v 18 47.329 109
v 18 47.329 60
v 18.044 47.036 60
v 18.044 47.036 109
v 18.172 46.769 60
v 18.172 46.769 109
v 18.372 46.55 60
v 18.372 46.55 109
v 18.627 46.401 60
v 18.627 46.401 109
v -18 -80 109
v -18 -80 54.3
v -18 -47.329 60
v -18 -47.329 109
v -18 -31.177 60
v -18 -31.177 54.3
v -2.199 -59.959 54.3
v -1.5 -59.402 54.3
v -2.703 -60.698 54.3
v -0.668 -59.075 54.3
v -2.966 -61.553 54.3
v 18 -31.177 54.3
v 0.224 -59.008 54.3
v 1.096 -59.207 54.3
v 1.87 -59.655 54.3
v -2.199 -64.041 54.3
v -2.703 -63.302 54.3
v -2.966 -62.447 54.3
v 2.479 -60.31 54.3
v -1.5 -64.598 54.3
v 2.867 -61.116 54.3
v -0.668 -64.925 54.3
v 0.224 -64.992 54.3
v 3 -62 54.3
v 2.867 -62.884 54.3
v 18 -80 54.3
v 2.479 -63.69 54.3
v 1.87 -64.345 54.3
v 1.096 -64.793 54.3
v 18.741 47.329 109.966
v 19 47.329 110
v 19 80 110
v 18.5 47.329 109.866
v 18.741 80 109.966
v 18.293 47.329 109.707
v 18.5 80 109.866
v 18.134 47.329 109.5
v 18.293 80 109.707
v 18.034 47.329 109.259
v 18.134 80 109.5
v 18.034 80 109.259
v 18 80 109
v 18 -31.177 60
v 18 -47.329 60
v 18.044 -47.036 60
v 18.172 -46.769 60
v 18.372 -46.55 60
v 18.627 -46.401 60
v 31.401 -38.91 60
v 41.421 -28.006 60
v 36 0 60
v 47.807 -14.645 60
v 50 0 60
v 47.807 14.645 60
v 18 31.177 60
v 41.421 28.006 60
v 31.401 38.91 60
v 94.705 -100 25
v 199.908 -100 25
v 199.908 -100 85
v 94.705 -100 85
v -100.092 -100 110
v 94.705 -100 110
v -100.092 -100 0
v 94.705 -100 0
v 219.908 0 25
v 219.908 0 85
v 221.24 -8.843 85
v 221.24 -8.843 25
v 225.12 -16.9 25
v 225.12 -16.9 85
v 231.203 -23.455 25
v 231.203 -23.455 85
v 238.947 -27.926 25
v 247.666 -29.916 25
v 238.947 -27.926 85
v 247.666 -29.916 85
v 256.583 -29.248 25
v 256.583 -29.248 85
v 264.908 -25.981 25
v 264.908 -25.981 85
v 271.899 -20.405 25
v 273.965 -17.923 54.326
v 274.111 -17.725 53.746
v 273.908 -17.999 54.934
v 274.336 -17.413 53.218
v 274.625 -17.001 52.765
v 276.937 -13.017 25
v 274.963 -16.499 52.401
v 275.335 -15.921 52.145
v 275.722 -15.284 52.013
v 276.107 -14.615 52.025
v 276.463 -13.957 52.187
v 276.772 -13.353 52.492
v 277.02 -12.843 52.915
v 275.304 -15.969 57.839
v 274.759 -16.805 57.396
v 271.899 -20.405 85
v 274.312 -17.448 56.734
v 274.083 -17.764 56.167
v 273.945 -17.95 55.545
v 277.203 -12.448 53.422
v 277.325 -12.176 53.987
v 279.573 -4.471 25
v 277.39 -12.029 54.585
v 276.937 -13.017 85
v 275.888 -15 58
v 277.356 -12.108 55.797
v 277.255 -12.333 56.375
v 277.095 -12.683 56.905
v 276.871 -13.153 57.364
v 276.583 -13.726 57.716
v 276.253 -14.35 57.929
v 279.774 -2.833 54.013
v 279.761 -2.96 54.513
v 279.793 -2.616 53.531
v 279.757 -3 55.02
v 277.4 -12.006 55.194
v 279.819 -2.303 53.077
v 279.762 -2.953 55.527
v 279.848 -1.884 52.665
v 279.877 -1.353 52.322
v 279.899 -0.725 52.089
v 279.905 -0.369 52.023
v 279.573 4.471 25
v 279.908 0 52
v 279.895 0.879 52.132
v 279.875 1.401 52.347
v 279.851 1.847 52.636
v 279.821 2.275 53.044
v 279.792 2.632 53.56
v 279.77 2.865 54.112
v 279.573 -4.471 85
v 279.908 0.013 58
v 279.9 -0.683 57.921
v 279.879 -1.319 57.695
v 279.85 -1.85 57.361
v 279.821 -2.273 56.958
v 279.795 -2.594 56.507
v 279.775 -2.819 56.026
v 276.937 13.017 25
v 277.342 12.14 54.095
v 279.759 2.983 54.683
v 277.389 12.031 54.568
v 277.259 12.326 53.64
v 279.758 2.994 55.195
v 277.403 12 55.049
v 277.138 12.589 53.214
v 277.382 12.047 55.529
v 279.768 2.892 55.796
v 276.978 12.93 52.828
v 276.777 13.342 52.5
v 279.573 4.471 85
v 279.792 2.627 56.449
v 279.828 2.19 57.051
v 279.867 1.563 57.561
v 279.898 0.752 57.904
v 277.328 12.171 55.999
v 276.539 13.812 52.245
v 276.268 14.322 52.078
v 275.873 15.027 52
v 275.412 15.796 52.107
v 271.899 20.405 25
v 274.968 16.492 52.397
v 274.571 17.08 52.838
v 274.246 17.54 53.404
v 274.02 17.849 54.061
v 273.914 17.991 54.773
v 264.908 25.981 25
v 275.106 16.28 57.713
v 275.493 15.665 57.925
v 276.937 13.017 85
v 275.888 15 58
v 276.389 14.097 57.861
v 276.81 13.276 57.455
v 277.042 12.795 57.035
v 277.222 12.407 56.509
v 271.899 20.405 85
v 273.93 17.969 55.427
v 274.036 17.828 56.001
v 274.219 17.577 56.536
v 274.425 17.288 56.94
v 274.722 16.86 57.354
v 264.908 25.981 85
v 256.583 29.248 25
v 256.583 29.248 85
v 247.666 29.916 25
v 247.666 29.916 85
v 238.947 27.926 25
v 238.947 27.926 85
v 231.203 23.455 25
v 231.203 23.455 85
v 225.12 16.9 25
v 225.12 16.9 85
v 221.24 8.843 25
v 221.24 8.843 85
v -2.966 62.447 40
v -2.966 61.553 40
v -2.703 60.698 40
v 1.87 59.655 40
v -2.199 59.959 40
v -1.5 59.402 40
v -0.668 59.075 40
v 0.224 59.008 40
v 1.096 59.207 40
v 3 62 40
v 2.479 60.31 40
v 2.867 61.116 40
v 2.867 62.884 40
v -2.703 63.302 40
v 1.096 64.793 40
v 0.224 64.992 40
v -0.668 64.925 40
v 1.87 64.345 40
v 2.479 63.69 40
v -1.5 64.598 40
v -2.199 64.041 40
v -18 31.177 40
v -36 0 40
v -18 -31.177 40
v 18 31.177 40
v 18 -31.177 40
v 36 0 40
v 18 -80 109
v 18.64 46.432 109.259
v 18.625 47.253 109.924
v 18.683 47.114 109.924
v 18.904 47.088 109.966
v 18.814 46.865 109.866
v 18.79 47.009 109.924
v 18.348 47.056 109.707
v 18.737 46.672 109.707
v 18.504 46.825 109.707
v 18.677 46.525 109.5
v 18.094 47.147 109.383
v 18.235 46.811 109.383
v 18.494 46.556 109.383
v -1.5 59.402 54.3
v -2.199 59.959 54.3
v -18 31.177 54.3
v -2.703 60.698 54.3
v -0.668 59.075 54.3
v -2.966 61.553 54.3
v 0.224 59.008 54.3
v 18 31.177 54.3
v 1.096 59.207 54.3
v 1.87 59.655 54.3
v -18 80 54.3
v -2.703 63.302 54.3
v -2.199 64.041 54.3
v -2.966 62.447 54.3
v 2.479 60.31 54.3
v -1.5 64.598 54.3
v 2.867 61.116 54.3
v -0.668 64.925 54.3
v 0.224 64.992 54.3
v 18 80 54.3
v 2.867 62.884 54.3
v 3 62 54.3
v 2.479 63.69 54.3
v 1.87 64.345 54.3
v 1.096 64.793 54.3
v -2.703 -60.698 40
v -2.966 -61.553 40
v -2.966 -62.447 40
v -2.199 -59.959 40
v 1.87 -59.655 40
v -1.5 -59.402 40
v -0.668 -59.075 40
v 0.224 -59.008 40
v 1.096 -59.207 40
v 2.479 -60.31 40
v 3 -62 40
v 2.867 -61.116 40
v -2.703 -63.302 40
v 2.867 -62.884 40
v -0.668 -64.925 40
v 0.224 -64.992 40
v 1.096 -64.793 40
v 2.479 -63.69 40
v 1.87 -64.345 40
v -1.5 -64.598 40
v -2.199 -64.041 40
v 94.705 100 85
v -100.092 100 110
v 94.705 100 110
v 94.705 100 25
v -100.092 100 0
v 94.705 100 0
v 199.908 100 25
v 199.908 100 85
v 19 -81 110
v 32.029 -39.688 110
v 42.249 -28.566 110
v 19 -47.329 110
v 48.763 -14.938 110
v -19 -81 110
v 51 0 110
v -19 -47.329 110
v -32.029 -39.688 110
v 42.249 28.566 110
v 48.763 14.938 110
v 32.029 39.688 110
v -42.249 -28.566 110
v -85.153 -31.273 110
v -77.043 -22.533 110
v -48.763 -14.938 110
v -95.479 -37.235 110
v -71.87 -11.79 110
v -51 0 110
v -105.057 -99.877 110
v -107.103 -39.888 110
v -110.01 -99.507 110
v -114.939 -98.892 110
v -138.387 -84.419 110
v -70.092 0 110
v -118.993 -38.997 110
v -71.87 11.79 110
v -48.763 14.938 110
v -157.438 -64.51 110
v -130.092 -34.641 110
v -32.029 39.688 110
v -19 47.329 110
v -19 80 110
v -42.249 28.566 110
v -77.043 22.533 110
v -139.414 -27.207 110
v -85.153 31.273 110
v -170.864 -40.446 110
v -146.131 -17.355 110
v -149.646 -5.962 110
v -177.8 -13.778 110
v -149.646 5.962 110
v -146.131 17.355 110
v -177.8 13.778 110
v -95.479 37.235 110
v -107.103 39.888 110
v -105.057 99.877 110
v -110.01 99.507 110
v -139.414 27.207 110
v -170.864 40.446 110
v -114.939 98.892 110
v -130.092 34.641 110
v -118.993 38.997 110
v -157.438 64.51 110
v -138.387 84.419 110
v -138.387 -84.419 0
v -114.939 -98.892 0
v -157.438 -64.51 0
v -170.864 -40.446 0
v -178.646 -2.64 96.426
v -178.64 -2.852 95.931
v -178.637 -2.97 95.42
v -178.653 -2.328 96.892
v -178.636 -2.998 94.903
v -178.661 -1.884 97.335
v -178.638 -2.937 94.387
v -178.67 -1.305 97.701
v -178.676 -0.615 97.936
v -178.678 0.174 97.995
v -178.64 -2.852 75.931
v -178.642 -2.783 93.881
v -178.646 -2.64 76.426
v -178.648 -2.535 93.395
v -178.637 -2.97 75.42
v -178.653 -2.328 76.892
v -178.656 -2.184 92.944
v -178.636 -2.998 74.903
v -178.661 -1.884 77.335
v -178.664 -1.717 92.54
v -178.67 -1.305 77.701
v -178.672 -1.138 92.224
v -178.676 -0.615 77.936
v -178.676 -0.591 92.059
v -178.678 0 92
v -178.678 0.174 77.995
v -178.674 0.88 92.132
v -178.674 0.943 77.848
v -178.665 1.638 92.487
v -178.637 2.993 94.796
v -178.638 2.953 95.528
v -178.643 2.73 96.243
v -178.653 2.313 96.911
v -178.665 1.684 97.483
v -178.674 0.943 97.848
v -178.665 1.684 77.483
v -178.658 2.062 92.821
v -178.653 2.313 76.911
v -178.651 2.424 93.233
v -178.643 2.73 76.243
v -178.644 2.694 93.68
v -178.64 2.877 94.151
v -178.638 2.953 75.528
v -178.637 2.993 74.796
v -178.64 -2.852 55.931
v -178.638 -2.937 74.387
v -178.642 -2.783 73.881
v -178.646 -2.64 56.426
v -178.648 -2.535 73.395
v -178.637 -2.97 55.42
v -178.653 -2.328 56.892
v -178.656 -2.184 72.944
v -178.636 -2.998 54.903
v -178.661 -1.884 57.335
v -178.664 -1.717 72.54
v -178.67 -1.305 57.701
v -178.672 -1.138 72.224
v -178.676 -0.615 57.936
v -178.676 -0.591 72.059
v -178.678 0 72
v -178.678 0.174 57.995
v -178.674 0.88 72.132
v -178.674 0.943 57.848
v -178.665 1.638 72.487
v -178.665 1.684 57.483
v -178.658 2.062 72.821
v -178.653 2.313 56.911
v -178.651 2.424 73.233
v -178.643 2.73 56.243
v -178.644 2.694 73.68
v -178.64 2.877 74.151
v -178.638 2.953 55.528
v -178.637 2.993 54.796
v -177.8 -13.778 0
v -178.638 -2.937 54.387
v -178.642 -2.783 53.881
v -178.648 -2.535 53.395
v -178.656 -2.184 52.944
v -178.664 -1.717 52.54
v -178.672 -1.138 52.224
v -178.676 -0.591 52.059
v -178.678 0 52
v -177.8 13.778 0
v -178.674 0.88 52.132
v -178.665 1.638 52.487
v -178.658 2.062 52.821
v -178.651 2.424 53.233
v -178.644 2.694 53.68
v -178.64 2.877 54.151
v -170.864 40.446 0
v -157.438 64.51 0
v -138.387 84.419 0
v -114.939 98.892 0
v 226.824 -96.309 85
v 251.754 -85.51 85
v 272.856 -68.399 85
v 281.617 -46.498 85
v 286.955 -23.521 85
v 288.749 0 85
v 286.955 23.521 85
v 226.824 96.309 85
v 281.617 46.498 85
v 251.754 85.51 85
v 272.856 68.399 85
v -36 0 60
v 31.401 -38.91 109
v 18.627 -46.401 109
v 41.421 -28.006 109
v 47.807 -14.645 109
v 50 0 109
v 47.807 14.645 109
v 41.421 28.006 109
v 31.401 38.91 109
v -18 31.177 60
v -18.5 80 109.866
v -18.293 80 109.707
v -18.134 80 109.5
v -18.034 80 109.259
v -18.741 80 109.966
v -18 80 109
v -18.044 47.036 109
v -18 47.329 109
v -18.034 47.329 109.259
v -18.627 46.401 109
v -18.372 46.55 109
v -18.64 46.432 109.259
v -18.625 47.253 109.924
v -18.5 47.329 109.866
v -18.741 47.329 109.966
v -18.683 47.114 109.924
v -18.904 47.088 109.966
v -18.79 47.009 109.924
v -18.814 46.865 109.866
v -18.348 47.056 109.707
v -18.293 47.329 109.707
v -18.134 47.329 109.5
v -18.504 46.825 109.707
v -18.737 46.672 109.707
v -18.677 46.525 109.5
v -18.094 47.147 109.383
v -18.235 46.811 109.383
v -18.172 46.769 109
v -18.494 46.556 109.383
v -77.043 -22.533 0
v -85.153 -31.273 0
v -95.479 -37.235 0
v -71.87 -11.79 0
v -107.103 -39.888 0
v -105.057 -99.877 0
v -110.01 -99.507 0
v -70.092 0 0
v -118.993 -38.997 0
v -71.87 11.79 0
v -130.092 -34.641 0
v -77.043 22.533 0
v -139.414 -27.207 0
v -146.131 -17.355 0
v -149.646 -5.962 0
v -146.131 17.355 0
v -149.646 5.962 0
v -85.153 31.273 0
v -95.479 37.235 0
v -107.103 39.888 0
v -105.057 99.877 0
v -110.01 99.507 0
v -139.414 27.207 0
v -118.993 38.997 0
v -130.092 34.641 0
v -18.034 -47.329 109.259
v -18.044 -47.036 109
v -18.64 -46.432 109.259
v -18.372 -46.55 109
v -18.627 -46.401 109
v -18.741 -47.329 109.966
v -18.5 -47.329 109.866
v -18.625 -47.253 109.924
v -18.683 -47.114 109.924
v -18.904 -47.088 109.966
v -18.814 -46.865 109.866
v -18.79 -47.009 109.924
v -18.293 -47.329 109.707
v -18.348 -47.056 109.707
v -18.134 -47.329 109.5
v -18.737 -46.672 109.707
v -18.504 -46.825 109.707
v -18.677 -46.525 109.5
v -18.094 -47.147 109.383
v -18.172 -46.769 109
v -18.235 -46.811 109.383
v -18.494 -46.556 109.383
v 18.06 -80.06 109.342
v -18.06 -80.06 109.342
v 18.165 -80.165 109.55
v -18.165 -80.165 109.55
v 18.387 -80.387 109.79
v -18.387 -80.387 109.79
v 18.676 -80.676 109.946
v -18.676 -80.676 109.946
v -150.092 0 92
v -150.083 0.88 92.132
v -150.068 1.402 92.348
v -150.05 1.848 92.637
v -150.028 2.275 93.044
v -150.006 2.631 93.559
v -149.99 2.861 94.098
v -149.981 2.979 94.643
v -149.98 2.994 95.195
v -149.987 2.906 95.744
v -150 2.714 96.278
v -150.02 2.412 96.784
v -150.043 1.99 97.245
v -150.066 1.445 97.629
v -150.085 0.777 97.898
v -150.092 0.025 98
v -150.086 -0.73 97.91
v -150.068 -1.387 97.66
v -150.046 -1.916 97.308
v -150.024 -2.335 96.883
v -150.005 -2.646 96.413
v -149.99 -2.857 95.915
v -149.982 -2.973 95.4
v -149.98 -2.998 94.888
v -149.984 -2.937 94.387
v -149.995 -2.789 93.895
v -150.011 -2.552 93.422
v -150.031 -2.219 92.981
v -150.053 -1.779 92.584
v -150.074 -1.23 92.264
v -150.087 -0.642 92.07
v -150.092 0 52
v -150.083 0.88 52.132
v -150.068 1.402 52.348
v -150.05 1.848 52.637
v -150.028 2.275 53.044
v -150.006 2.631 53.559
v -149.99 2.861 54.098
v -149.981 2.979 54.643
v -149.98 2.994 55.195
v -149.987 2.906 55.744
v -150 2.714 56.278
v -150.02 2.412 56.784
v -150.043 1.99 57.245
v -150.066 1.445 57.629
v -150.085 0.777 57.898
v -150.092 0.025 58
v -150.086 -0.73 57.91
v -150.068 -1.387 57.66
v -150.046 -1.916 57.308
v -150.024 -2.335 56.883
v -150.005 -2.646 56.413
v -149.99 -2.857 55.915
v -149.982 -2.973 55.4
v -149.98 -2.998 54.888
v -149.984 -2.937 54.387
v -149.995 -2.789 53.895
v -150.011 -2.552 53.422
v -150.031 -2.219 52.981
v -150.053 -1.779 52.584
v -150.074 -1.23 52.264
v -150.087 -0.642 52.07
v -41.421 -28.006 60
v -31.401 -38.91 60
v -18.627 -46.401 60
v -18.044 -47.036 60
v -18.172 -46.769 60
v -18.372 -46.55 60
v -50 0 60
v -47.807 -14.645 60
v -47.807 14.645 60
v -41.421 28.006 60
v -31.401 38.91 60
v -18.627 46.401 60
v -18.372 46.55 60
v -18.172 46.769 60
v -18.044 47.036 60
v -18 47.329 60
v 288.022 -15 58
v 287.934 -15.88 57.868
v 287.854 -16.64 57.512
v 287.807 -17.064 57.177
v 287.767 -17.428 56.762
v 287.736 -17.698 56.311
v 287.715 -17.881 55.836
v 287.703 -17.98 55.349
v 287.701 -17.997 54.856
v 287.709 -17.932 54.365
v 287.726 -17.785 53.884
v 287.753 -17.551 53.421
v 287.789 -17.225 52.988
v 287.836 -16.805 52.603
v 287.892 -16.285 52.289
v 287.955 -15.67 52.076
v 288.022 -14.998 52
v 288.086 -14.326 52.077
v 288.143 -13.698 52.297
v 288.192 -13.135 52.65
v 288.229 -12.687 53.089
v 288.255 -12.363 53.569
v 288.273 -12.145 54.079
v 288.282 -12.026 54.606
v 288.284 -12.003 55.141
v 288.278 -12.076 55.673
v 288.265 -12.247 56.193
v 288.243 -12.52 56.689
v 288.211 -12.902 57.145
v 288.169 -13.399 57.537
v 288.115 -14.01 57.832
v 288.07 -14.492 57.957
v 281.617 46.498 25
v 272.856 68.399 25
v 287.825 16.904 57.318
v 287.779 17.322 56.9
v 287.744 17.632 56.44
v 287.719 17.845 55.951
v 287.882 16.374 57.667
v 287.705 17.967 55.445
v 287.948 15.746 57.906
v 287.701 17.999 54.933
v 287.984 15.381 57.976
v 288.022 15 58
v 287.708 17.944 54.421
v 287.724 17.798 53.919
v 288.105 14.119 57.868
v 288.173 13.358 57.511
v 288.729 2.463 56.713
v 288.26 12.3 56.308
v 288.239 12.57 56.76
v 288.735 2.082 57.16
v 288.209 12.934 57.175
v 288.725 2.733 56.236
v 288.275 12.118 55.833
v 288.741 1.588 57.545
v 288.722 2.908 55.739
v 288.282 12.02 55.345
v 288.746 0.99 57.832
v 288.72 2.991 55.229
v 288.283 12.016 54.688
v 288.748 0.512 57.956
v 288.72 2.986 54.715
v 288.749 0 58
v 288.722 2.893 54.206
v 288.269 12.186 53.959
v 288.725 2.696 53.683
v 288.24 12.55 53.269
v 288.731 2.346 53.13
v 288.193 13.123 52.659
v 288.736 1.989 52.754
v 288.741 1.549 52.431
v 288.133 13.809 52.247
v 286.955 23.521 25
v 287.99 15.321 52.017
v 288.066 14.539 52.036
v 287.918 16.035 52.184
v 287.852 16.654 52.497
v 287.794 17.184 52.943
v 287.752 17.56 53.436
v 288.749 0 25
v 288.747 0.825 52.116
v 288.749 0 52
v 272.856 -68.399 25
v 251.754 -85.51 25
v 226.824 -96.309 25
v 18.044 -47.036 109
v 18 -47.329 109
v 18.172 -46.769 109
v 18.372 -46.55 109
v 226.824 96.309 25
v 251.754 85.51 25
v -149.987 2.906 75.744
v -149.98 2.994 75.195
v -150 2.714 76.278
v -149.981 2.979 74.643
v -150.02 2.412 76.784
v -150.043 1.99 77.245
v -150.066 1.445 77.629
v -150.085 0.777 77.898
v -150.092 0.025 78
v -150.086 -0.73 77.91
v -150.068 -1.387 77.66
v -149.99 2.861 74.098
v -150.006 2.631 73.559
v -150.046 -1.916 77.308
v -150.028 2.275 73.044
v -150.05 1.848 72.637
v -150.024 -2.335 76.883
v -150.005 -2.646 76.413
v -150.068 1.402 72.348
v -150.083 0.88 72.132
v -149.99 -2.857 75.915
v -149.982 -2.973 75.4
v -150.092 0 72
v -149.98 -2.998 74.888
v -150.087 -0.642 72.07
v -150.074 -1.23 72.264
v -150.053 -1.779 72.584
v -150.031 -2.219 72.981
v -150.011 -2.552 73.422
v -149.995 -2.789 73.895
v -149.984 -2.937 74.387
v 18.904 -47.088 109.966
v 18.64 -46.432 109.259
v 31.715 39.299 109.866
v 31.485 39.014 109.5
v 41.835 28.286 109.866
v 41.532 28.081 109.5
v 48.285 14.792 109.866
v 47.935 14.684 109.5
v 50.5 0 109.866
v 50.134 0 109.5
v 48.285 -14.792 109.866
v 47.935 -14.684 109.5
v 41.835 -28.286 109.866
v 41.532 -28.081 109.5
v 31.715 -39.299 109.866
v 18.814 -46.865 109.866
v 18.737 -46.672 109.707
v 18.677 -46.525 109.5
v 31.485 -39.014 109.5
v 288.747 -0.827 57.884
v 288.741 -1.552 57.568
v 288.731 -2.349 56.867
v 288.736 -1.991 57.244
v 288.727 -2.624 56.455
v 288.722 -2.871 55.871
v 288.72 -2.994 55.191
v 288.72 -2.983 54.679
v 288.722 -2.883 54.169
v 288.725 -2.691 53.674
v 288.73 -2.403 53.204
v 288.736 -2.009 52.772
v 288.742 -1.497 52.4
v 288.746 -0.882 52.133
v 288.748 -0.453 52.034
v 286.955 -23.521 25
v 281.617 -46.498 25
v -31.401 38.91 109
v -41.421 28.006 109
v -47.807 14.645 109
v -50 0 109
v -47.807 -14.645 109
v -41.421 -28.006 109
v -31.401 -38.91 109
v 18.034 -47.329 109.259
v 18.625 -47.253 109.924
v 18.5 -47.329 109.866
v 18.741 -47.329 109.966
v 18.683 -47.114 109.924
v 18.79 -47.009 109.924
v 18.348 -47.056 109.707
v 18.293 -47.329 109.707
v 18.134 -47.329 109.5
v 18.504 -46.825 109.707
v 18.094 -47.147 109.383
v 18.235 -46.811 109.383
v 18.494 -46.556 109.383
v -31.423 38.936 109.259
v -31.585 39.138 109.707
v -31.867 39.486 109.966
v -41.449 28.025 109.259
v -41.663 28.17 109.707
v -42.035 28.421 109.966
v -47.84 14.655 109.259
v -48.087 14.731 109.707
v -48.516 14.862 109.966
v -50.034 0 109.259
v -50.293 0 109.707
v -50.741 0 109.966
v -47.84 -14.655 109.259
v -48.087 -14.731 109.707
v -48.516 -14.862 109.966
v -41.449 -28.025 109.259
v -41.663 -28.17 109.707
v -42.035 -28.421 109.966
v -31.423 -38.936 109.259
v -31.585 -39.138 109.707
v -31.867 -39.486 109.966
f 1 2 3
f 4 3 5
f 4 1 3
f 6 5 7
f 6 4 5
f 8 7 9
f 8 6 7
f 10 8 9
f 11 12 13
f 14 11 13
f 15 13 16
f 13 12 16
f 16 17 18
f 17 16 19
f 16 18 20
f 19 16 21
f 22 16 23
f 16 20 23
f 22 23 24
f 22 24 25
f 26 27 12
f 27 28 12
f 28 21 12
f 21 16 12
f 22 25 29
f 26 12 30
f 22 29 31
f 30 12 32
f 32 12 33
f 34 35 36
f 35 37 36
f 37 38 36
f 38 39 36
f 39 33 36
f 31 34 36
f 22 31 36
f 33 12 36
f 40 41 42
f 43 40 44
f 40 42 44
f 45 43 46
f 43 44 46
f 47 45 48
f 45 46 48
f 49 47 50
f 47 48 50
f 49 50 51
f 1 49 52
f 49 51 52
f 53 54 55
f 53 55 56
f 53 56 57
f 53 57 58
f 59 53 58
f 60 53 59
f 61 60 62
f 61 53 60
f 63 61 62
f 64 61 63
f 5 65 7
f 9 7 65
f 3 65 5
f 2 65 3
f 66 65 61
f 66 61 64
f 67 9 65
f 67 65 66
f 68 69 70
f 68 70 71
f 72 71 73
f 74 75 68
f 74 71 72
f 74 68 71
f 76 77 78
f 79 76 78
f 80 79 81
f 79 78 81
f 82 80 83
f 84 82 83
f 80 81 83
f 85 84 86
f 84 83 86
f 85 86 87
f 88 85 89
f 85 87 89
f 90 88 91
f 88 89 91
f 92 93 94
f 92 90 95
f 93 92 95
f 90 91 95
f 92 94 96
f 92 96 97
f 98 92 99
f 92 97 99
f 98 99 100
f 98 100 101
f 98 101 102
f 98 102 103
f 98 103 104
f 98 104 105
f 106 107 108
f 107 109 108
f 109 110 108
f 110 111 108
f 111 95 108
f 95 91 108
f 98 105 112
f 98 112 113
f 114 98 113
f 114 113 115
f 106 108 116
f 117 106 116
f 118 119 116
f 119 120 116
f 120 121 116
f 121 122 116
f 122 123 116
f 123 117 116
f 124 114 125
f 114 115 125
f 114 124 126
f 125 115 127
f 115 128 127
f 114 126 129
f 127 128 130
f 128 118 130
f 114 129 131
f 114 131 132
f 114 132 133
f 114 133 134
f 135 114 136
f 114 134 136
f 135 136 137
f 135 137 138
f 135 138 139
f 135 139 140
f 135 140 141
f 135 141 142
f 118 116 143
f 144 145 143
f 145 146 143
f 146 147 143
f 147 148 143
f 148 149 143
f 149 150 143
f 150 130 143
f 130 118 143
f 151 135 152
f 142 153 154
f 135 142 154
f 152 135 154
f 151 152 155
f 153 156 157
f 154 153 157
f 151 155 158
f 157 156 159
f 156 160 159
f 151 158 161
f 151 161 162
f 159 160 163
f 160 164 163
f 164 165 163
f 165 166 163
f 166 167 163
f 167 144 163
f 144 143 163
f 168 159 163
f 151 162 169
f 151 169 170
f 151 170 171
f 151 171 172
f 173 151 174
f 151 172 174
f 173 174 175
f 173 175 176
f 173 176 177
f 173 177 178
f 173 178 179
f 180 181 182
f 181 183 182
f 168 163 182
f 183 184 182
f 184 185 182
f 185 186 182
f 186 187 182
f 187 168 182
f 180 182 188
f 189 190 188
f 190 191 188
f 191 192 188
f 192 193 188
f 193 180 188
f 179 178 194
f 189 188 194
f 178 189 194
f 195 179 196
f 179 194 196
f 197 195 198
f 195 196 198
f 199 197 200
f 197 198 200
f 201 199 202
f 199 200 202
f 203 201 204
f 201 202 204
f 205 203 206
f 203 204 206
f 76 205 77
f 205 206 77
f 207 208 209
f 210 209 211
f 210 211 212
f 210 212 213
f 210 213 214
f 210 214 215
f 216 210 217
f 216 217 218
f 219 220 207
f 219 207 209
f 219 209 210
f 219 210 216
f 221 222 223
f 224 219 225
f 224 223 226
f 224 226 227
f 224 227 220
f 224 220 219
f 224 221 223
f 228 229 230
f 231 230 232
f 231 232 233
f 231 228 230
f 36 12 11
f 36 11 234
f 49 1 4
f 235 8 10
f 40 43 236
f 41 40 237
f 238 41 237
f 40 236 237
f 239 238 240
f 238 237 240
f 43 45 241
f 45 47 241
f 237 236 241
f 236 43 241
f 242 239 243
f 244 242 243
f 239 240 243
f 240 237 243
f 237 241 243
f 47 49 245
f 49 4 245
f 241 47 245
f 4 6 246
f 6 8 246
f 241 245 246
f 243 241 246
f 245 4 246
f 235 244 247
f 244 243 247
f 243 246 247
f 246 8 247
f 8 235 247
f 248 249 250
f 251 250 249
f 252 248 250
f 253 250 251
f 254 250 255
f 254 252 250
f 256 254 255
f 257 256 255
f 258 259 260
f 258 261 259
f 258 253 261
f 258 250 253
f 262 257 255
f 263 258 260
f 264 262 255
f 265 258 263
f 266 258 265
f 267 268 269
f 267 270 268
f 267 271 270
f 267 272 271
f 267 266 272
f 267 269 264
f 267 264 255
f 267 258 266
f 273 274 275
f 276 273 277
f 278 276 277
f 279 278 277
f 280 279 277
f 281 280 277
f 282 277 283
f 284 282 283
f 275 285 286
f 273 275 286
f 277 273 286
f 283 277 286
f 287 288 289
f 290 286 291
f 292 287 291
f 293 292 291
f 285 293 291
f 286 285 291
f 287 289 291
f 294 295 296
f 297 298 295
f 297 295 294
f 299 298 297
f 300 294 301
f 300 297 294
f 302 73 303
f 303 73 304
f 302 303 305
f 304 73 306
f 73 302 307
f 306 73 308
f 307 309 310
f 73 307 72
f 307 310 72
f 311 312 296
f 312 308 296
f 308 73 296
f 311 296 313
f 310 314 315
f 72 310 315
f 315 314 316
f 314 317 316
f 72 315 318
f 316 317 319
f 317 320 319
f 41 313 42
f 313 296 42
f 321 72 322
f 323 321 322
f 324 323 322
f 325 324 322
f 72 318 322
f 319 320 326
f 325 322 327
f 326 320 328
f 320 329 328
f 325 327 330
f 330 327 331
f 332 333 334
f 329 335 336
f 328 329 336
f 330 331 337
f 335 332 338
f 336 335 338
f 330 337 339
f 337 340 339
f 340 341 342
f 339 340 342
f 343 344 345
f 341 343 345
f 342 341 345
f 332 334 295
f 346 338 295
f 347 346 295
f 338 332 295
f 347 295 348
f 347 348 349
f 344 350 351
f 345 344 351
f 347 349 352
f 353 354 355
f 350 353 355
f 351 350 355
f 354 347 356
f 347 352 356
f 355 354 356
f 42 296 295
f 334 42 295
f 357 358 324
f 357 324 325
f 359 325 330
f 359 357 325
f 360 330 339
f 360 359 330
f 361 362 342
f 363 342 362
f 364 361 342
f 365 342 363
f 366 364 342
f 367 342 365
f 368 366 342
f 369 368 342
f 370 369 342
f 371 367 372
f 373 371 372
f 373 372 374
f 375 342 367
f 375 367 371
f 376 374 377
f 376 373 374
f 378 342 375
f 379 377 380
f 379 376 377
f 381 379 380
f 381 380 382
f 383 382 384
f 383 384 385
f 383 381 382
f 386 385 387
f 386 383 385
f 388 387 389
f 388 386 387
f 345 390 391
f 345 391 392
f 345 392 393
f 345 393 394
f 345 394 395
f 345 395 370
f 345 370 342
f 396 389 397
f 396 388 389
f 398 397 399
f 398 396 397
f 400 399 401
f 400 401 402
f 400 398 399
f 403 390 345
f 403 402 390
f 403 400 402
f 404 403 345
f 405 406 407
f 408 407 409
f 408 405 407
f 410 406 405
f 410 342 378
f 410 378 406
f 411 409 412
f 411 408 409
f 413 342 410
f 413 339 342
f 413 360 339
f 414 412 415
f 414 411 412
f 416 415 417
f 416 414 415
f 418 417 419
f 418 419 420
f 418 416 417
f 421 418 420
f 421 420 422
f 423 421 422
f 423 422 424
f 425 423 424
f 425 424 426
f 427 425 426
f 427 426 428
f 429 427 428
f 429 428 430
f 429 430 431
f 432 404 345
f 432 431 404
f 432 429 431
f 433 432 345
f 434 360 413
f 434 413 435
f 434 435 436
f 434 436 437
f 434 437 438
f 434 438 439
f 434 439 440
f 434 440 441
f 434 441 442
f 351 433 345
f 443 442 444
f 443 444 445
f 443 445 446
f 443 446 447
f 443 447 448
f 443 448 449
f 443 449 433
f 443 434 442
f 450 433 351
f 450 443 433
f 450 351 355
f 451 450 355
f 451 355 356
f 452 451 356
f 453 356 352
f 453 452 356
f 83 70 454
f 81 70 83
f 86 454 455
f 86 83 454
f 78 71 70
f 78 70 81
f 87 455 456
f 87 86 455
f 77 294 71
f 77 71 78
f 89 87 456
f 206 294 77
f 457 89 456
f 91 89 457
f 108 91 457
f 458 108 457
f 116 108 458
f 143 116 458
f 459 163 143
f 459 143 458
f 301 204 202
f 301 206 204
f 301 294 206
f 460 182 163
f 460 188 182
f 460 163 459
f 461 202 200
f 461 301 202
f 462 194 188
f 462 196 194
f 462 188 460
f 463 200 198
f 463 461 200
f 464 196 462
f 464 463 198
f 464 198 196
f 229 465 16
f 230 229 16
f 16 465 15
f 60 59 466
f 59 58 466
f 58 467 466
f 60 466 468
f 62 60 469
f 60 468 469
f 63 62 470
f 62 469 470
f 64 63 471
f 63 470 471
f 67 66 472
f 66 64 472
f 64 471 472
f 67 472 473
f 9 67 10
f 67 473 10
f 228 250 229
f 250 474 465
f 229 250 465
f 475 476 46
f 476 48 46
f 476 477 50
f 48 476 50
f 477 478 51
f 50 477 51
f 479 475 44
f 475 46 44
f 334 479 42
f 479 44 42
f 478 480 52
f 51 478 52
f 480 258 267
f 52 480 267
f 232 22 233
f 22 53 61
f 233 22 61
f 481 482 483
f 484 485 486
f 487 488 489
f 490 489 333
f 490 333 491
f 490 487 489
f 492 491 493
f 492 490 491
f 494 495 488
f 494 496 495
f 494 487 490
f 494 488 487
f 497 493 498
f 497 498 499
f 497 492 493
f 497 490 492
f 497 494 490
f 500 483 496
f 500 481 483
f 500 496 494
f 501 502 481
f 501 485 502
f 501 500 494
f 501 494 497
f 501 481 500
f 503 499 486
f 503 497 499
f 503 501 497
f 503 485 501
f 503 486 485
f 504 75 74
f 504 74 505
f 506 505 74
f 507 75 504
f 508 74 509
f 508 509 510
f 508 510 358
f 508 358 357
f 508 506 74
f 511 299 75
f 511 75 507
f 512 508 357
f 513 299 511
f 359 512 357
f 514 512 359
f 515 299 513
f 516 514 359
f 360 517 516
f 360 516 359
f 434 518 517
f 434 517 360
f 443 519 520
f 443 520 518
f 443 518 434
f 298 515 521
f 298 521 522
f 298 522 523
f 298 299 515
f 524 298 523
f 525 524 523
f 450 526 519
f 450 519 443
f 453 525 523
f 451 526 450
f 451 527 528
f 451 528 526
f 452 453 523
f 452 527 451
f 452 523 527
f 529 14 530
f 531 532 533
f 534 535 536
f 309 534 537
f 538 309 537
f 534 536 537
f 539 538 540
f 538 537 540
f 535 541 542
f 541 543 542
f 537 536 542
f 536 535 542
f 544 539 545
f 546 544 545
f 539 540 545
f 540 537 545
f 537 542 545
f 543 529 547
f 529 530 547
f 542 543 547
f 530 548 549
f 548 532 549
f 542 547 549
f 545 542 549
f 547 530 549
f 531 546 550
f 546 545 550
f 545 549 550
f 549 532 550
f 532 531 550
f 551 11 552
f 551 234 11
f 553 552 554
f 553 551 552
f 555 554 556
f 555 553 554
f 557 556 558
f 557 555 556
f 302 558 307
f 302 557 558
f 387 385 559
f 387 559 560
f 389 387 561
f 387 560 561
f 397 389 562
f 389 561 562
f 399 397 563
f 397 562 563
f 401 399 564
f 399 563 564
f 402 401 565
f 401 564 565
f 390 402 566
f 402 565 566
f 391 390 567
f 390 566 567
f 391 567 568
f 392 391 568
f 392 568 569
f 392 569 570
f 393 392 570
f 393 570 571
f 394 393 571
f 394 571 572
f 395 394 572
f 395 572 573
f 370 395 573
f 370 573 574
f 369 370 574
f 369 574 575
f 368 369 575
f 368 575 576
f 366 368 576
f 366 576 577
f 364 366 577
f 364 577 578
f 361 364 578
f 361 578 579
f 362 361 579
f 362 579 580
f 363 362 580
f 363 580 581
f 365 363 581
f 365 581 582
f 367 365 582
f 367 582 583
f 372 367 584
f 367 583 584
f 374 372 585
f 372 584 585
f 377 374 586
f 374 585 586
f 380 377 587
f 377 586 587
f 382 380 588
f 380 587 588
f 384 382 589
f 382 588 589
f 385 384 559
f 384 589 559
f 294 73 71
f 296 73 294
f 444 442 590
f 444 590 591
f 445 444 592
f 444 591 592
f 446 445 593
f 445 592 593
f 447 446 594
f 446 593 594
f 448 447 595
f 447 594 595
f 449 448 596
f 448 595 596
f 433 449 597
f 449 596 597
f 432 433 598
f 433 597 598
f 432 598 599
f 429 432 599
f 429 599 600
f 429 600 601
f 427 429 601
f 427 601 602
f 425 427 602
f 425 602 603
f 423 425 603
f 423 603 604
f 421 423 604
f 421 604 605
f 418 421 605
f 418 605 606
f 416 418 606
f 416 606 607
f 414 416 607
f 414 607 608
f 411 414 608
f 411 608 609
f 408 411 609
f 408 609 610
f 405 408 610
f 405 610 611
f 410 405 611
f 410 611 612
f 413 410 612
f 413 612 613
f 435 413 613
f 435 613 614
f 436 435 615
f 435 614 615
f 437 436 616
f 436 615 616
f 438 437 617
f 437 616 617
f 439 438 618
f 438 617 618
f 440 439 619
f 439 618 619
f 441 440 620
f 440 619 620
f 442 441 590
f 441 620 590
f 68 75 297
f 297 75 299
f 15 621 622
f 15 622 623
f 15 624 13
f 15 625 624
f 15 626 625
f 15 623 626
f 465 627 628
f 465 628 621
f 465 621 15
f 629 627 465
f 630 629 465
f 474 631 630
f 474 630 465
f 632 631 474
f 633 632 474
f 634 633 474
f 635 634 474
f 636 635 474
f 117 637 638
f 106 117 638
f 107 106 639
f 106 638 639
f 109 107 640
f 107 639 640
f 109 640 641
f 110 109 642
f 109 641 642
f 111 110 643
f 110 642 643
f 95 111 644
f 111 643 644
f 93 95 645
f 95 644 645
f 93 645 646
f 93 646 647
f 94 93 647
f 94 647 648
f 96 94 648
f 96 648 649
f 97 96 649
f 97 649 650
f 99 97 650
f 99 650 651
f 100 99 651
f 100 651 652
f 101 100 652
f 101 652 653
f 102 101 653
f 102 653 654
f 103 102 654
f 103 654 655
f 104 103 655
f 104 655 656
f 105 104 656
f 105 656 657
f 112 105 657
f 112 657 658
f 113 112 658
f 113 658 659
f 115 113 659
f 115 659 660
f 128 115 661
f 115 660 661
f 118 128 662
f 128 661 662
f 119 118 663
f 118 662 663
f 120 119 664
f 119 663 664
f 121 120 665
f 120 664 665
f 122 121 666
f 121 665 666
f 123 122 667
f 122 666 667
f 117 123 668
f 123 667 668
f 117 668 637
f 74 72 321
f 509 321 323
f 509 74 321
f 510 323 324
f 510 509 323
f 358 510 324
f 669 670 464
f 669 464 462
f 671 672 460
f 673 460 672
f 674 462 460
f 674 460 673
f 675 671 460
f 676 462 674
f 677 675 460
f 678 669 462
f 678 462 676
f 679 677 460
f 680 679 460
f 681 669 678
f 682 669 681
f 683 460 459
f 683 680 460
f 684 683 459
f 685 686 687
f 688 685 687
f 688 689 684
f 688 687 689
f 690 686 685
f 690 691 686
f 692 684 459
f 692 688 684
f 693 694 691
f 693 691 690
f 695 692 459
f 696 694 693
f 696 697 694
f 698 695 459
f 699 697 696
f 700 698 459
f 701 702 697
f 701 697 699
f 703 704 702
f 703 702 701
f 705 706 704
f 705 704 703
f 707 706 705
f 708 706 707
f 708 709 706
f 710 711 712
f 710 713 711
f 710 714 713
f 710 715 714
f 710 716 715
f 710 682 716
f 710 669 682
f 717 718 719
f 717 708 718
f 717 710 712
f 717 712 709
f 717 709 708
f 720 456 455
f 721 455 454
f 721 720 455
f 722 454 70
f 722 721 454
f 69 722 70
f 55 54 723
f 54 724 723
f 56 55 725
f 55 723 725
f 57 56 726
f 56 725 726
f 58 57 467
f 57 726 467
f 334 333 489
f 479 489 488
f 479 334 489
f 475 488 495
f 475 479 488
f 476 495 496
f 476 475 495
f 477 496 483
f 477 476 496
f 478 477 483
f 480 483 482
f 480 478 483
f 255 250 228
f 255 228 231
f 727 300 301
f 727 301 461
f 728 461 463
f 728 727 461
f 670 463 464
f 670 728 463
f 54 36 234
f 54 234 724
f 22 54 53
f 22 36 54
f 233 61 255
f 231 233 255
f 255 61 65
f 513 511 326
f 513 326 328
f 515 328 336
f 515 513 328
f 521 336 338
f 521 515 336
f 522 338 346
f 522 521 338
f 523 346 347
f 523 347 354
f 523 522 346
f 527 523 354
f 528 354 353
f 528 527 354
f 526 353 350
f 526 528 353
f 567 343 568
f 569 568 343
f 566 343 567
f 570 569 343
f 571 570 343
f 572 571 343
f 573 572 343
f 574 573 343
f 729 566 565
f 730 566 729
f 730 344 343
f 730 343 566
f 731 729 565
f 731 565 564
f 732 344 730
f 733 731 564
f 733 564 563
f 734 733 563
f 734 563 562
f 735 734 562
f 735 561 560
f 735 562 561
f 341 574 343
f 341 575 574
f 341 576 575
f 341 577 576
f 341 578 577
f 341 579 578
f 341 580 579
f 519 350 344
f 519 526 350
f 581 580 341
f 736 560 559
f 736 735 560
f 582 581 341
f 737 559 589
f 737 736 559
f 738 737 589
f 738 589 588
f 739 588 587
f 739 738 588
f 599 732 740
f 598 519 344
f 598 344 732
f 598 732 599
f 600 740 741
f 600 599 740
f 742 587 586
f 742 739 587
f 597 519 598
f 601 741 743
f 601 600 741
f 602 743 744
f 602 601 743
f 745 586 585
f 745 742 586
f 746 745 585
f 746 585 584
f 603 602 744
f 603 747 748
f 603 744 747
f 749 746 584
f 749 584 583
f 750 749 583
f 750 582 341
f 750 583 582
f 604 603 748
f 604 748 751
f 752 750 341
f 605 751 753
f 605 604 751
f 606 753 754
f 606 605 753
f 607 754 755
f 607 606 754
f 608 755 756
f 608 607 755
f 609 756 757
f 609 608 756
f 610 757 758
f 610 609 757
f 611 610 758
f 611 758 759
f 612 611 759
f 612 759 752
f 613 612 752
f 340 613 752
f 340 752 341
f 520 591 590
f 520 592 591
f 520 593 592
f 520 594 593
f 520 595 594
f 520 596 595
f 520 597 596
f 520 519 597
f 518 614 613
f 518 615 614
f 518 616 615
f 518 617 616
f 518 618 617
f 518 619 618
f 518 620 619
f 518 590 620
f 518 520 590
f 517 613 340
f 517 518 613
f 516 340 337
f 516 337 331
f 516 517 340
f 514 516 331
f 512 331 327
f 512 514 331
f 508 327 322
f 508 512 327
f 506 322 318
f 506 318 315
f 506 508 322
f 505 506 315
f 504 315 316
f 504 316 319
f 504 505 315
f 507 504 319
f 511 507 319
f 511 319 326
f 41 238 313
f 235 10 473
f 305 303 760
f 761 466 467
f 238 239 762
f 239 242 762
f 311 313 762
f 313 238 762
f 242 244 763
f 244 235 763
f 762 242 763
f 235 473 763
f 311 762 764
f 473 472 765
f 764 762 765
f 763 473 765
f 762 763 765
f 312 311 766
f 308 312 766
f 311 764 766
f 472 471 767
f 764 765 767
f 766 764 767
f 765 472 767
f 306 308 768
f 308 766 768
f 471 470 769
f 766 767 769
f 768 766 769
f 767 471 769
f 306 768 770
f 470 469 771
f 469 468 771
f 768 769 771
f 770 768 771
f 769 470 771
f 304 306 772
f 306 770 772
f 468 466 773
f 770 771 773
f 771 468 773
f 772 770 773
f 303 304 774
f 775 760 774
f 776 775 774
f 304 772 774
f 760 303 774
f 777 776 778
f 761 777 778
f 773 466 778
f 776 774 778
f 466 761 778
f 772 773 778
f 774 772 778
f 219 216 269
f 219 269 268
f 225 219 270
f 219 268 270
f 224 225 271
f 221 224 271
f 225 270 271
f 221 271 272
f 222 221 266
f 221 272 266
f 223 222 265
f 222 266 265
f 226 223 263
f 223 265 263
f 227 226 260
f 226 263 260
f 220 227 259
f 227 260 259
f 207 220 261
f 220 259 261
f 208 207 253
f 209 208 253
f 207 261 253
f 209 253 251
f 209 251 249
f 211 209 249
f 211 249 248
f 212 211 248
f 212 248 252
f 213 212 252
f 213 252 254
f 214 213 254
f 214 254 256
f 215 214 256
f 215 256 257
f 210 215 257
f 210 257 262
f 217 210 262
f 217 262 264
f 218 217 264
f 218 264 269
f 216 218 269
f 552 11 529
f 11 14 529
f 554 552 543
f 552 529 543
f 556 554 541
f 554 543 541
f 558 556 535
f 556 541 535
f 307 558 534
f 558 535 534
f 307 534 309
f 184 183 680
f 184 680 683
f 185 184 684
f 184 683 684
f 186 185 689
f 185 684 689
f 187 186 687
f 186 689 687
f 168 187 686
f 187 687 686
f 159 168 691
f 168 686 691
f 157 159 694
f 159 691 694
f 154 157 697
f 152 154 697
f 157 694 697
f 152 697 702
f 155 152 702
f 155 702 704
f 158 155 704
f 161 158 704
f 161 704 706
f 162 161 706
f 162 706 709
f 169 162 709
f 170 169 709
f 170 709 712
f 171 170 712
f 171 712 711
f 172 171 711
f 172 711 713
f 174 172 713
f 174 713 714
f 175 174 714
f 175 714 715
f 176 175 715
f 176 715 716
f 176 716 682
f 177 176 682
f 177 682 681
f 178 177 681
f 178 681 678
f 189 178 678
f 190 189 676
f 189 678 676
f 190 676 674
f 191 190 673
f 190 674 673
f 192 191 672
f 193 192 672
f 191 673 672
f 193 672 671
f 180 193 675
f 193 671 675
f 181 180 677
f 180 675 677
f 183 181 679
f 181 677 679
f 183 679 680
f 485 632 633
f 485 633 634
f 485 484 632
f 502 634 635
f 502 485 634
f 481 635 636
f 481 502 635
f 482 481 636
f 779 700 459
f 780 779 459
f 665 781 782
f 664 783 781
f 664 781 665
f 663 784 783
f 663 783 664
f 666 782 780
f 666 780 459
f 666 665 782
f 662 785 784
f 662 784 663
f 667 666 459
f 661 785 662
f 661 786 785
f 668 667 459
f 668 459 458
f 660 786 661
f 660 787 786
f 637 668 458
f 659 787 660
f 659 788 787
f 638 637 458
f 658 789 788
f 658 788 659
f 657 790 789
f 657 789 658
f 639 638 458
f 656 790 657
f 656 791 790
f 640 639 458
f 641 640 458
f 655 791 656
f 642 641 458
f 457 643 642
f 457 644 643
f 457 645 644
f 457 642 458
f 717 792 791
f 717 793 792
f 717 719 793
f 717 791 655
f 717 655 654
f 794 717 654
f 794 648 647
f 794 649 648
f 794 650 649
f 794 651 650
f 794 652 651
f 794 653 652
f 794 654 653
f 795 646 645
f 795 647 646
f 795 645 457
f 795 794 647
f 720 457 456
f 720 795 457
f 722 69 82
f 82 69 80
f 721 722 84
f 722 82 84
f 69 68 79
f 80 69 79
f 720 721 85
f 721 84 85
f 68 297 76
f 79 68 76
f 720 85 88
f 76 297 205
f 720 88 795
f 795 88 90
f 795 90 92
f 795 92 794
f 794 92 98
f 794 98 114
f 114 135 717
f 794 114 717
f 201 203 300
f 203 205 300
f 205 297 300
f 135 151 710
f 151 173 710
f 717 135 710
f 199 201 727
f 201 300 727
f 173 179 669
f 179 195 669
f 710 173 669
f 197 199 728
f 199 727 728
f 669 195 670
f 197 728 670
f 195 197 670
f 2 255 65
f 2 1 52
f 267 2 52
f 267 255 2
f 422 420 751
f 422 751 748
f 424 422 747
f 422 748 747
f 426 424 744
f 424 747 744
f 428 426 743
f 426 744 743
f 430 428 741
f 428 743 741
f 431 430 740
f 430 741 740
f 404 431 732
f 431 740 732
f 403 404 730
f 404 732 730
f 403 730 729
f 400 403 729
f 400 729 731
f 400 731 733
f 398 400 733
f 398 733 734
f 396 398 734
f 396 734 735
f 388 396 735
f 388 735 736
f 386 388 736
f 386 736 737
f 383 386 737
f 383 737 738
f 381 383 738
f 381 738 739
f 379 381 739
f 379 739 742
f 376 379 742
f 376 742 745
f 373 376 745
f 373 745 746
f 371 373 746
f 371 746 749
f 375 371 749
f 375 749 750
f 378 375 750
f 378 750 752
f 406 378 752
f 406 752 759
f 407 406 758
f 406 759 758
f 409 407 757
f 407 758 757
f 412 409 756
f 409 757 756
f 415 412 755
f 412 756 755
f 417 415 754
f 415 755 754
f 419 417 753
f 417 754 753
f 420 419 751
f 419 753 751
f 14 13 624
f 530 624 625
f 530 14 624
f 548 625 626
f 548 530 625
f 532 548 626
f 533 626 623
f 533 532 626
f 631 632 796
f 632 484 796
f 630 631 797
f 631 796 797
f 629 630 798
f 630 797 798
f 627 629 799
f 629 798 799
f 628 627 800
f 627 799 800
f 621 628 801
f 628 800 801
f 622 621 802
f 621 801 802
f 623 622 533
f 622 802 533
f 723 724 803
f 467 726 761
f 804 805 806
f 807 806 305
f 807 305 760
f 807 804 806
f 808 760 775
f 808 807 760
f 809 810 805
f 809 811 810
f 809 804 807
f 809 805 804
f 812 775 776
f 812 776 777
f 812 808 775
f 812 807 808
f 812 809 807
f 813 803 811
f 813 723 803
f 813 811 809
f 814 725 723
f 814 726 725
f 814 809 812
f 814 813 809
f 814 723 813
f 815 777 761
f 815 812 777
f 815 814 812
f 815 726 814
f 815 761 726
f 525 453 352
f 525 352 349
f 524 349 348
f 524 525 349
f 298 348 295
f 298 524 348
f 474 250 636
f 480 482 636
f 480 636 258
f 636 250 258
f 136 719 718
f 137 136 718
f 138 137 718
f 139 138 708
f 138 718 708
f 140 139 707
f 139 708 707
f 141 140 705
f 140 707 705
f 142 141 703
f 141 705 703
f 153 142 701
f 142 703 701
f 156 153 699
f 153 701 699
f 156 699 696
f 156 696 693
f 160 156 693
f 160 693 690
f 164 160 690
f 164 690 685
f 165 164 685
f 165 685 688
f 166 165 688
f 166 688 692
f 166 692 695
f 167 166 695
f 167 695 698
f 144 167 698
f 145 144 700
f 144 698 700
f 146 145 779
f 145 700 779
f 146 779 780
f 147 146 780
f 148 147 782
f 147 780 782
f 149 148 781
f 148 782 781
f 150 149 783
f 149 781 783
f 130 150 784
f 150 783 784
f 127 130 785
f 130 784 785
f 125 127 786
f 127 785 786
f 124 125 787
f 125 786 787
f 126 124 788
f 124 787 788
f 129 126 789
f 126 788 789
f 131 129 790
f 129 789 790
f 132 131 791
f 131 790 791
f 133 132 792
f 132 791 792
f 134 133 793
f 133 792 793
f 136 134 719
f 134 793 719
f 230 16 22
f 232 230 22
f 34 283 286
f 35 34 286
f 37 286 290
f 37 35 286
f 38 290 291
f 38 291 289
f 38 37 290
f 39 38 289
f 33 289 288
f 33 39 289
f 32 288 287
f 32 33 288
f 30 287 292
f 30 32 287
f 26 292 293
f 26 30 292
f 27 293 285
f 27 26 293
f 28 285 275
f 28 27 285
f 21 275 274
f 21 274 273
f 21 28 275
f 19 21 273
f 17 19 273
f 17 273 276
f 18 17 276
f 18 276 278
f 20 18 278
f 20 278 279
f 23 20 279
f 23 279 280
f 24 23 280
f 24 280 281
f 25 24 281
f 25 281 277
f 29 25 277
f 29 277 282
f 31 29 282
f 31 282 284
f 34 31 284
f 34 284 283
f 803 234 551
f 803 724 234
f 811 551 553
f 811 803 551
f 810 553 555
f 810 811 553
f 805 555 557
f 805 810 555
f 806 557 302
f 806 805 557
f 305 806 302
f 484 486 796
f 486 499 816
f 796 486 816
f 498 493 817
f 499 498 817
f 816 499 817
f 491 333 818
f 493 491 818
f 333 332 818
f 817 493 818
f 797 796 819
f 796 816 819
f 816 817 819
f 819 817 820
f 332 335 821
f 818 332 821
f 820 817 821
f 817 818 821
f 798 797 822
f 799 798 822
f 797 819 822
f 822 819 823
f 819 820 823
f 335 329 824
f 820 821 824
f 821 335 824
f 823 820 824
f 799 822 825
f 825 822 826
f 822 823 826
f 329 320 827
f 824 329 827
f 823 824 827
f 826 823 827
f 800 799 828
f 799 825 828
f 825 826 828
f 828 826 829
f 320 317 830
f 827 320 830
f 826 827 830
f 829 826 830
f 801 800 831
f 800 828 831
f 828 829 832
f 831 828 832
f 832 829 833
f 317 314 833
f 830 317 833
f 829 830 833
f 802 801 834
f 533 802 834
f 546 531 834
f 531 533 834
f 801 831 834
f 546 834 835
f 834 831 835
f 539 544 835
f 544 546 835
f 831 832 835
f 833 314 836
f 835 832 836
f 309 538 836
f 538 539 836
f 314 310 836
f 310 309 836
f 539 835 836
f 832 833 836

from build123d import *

# Parameters (mm, degrees)
SKETCH_1_R           = 40
EXTRUDE_1_DEPTH      = 110
SKETCH_2_R           = 3
CUT_EXTRUDE_2_DEPTH  = 150
SKETCH_3_R           = 50
CUT_EXTRUDE_3_DEPTH  = 50
CUT_EXTRUDE_4_DEPTH  = 10
SKETCH_5_W           = 36
SKETCH_5_H           = 160
CUT_EXTRUDE_7_DEPTH  = 122
CUT_EXTRUDE_8_DEPTH  = 10
SKETCH_7_R           = 3
CUT_EXTRUDE_9_DEPTH  = 10
EXTRUDE_START        = 4.3
EXTRUDE_2_DEPTH      = 4.3
SKETCH_11_W          = 36
SKETCH_11_H          = 48.823085464
SKETCH_11_R          = 3
EXTRUDE_3_DEPTH      = 4.3
CUT_EXTRUDE_START    = -200
CUT_EXTRUDE_16_DEPTH = 200
FILLET_2_R           = 1
CUT_EXTRUDE_START_2  = -25
CUT_EXTRUDE_17_DEPTH = 25
SKETCH_16_R          = 30
CUT_EXTRUDE_18_DEPTH = 100
SKETCH_17_R          = 100
CUT_EXTRUDE_19_DEPTH = 25
CUT_EXTRUDE_START_3  = -100
CUT_EXTRUDE_20_DEPTH = 100
SKETCH_19_W          = 186.41721719
SKETCH_19_H          = 278.516199491
CUT_EXTRUDE_21_DEPTH = 25
CUT_EXTRUDE_START_4  = 500
SKETCH_20_R          = 3
CUT_EXTRUDE_22_DEPTH = 500


with BuildPart() as part:
    # 草图1 → 凸台-拉伸1 (new body)
    with BuildSketch(Plane.XY):
        with BuildLine():
            Line((-100.092421442, 100), (199.907578558, 100))
            ThreePointArc((199.907578558, 100), (299.907578558, 0), (199.907578558, -100))
            Line((199.907578558, -100), (-100.092421442, -100))
            ThreePointArc((-100.092421442, -100), (-200.092421442, 0), (-100.092421442, 100))
        make_face()
        with Locations((-110.092421442, 0)):
            Circle(SKETCH_1_R, mode=Mode.SUBTRACT)
    extrude(amount=EXTRUDE_1_DEPTH)

    # 草图2 → 切除-拉伸2 (cut)
    with BuildSketch(Plane(origin=(-100, 0, 0), x_dir=(0, 0, -1), z_dir=(1, 0, 0))):
        with Locations((-95, 0)):
            Circle(SKETCH_2_R)
        with Locations((-75, 0)):
            Circle(SKETCH_2_R)
        with Locations((-55, 0)):
            Circle(SKETCH_2_R)
    extrude(amount=-CUT_EXTRUDE_2_DEPTH, mode=Mode.SUBTRACT)

    # 草图3 → 切除-拉伸3 (cut)
    with BuildSketch(Plane.XY.offset(110)):
        Circle(SKETCH_3_R)
    extrude(amount=-CUT_EXTRUDE_3_DEPTH, mode=Mode.SUBTRACT)

    # 草图4 → 切除-拉伸4 (cut)
    with BuildSketch(Plane.XY.offset(60)):
        Polygon((36, 0), (18, 31.176914536), (-18, 31.176914536), (-36, 0), (-18, -31.176914536), (18, -31.176914536), align=None)
    extrude(amount=-CUT_EXTRUDE_4_DEPTH, mode=Mode.SUBTRACT)

    # 草图5 → 切除-拉伸7 (cut)
    with BuildSketch(Plane.XY.offset(50)):
        Rectangle(SKETCH_5_W, SKETCH_5_H)
    extrude(amount=CUT_EXTRUDE_7_DEPTH, mode=Mode.SUBTRACT)

    # 草图6 → 切除-拉伸8 (cut)
    with BuildSketch(Plane.XY.offset(50)):
        Polygon((36, 0), (18, 31.176914536), (-18, 31.176914536), (-36, 0), (-18, -31.176914536), (18, -31.176914536), align=None)
    extrude(amount=-CUT_EXTRUDE_8_DEPTH, mode=Mode.SUBTRACT)

    # 草图7 → 切除-拉伸9 (cut)
    with BuildSketch(Plane.XY.offset(50)):
        with Locations((0, 62)):
            Circle(SKETCH_7_R)
    cut_extrude_9 = extrude(amount=-CUT_EXTRUDE_9_DEPTH, mode=Mode.SUBTRACT)

    # 镜向1: 切除-拉伸9 across plane
    add(cut_extrude_9.mirror(Plane.ZX), mode=Mode.SUBTRACT)

    # 草图10 → 凸台-拉伸2 (add)
    with BuildSketch(Plane.XY.offset(40).offset(EXTRUDE_START)):
        with BuildLine():
            Line((36, 0), (18, -31.176914536))
            Line((18, -31.176914536), (18, -46.647615159))
            ThreePointArc((18, -46.647615159), (50, 0), (18, 46.647615159))
            Line((18, 46.647615159), (18, 31.176914536))
            Line((18, 31.176914536), (36, 0))
        make_face()
        with BuildLine():
            Line((-18, -46.647615159), (-18, -31.176914536))
            Line((-18, -31.176914536), (-36, 0))
            Line((-36, 0), (-18, 31.176914536))
            Line((-18, 31.176914536), (-18, 46.647615159))
            ThreePointArc((-18, 46.647615159), (-50, 0), (-18, -46.647615159))
        make_face()
    extrude(amount=-EXTRUDE_2_DEPTH)

    # 草图11 → 凸台-拉伸3 (add)
    with BuildSketch(Plane.XY.offset(50).offset(EXTRUDE_START)):
        with Locations((0, 55.588457268)):
            Rectangle(SKETCH_11_W, SKETCH_11_H)
        with Locations((0, 62)):
            Circle(SKETCH_11_R, mode=Mode.SUBTRACT)
    extrude_3 = extrude(amount=-EXTRUDE_3_DEPTH)

    # 镜向4: 凸台-拉伸3 across plane
    add(extrude_3.mirror(Plane.ZX))

    # 草图14 → 切除-拉伸16 (cut)
    with BuildSketch(Plane.XY.offset(110).offset(CUT_EXTRUDE_START)):
        with BuildLine():
            ThreePointArc((-114.938685096, -98.891801761), (-178.67776032, 0), (-114.938685096, 98.891801761))
            ThreePointArc((-114.938685096, 98.891801761), (-200.092421442, 0), (-114.938685096, -98.891801761))
        make_face()
    extrude(amount=CUT_EXTRUDE_16_DEPTH, mode=Mode.SUBTRACT)

    # 圆角2
    fillet_2_edges = [part.edges().sort_by_distance(p)[0] for p in [
        (18, 46.647615159, 85),
        (18, 63.323807579, 110),
        (-18, 63.323807579, 110),
        (-18, 46.647615159, 85),
        (-18, -46.647615159, 85),
        (-50, 0, 110),
        (-18, -63.323807579, 110),
        (0, -80, 110),
        (18, -46.647615159, 85),
        (18, -63.323807579, 110),
        (50, 0, 110),
    ]]
    fillet(fillet_2_edges, radius=FILLET_2_R)

    # 草图15 → 切除-拉伸17 (cut)
    with BuildSketch(Plane.XY.offset(110).offset(CUT_EXTRUDE_START_2)):
        with BuildLine():
            ThreePointArc((299.907578558, 0), (270.618256677, 70.710678119), (199.907578558, 100))
            Line((199.907578558, 100), (199.907578558, -100))
            ThreePointArc((199.907578558, -100), (270.618256677, -70.710678119), (299.907578558, 0))
        make_face()
    cut_extrude_17 = extrude(amount=CUT_EXTRUDE_17_DEPTH, mode=Mode.SUBTRACT)

    # 镜向5: 切除-拉伸17 across plane
    add(cut_extrude_17.mirror(Plane.XY.offset(55)), mode=Mode.SUBTRACT)

    # 草图16 → 切除-拉伸18 (cut)
    with BuildSketch(Plane.XY.offset(85)):
        with Locations((249.907578558, 0)):
            Circle(SKETCH_16_R)
    extrude(amount=-CUT_EXTRUDE_18_DEPTH, mode=Mode.SUBTRACT)

    # 草图17 → 切除-拉伸19 (cut)
    with BuildSketch(Plane.XY.offset(110).offset(CUT_EXTRUDE_START_2)):
        with Locations((199.907578558, 0)):
            Circle(SKETCH_17_R)
    cut_extrude_19 = extrude(amount=CUT_EXTRUDE_19_DEPTH, mode=Mode.SUBTRACT)

    # 镜向6: 切除-拉伸19 across plane
    add(cut_extrude_19.mirror(Plane.XY.offset(55)), mode=Mode.SUBTRACT)

    # 草图18 → 切除-拉伸20 (cut)
    with BuildSketch(Plane.XY.offset(85).offset(CUT_EXTRUDE_START_3)):
        with BuildLine():
            ThreePointArc((272.856353648, 68.399387519), (284.723437561, 35.110699351), (288.748761353, 0))
            ThreePointArc((288.748761353, 0), (284.723437561, -35.110699351), (272.856353648, -68.399387519))
            ThreePointArc((272.856353648, -68.399387519), (299.907578558, 0), (272.856353648, 68.399387519))
        make_face()
    extrude(amount=CUT_EXTRUDE_20_DEPTH, mode=Mode.SUBTRACT)

    # 草图19 → 切除-拉伸21 (cut)
    with BuildSketch(Plane.XY.offset(110)):
        with Locations((187.913249079, -8.044790623)):
            Rectangle(SKETCH_19_W, SKETCH_19_H)
    cut_extrude_21 = extrude(amount=-CUT_EXTRUDE_21_DEPTH, mode=Mode.SUBTRACT)

    # 镜向7: 切除-拉伸21 across plane
    add(cut_extrude_21.mirror(Plane.XY.offset(55)), mode=Mode.SUBTRACT)

    # 草图20 → 切除-拉伸22 (cut)
    with BuildSketch(Plane(origin=(230, 0, 0), x_dir=(0, 0, -1), z_dir=(1, 0, 0)).offset(CUT_EXTRUDE_START_4)):
        with Locations((-55, 0)):
            Circle(SKETCH_20_R)
        with Locations((-55, 15)):
            Circle(SKETCH_20_R)
        with Locations((-55, -15)):
            Circle(SKETCH_20_R)
    extrude(amount=-CUT_EXTRUDE_22_DEPTH, mode=Mode.SUBTRACT)


solid = part.part
